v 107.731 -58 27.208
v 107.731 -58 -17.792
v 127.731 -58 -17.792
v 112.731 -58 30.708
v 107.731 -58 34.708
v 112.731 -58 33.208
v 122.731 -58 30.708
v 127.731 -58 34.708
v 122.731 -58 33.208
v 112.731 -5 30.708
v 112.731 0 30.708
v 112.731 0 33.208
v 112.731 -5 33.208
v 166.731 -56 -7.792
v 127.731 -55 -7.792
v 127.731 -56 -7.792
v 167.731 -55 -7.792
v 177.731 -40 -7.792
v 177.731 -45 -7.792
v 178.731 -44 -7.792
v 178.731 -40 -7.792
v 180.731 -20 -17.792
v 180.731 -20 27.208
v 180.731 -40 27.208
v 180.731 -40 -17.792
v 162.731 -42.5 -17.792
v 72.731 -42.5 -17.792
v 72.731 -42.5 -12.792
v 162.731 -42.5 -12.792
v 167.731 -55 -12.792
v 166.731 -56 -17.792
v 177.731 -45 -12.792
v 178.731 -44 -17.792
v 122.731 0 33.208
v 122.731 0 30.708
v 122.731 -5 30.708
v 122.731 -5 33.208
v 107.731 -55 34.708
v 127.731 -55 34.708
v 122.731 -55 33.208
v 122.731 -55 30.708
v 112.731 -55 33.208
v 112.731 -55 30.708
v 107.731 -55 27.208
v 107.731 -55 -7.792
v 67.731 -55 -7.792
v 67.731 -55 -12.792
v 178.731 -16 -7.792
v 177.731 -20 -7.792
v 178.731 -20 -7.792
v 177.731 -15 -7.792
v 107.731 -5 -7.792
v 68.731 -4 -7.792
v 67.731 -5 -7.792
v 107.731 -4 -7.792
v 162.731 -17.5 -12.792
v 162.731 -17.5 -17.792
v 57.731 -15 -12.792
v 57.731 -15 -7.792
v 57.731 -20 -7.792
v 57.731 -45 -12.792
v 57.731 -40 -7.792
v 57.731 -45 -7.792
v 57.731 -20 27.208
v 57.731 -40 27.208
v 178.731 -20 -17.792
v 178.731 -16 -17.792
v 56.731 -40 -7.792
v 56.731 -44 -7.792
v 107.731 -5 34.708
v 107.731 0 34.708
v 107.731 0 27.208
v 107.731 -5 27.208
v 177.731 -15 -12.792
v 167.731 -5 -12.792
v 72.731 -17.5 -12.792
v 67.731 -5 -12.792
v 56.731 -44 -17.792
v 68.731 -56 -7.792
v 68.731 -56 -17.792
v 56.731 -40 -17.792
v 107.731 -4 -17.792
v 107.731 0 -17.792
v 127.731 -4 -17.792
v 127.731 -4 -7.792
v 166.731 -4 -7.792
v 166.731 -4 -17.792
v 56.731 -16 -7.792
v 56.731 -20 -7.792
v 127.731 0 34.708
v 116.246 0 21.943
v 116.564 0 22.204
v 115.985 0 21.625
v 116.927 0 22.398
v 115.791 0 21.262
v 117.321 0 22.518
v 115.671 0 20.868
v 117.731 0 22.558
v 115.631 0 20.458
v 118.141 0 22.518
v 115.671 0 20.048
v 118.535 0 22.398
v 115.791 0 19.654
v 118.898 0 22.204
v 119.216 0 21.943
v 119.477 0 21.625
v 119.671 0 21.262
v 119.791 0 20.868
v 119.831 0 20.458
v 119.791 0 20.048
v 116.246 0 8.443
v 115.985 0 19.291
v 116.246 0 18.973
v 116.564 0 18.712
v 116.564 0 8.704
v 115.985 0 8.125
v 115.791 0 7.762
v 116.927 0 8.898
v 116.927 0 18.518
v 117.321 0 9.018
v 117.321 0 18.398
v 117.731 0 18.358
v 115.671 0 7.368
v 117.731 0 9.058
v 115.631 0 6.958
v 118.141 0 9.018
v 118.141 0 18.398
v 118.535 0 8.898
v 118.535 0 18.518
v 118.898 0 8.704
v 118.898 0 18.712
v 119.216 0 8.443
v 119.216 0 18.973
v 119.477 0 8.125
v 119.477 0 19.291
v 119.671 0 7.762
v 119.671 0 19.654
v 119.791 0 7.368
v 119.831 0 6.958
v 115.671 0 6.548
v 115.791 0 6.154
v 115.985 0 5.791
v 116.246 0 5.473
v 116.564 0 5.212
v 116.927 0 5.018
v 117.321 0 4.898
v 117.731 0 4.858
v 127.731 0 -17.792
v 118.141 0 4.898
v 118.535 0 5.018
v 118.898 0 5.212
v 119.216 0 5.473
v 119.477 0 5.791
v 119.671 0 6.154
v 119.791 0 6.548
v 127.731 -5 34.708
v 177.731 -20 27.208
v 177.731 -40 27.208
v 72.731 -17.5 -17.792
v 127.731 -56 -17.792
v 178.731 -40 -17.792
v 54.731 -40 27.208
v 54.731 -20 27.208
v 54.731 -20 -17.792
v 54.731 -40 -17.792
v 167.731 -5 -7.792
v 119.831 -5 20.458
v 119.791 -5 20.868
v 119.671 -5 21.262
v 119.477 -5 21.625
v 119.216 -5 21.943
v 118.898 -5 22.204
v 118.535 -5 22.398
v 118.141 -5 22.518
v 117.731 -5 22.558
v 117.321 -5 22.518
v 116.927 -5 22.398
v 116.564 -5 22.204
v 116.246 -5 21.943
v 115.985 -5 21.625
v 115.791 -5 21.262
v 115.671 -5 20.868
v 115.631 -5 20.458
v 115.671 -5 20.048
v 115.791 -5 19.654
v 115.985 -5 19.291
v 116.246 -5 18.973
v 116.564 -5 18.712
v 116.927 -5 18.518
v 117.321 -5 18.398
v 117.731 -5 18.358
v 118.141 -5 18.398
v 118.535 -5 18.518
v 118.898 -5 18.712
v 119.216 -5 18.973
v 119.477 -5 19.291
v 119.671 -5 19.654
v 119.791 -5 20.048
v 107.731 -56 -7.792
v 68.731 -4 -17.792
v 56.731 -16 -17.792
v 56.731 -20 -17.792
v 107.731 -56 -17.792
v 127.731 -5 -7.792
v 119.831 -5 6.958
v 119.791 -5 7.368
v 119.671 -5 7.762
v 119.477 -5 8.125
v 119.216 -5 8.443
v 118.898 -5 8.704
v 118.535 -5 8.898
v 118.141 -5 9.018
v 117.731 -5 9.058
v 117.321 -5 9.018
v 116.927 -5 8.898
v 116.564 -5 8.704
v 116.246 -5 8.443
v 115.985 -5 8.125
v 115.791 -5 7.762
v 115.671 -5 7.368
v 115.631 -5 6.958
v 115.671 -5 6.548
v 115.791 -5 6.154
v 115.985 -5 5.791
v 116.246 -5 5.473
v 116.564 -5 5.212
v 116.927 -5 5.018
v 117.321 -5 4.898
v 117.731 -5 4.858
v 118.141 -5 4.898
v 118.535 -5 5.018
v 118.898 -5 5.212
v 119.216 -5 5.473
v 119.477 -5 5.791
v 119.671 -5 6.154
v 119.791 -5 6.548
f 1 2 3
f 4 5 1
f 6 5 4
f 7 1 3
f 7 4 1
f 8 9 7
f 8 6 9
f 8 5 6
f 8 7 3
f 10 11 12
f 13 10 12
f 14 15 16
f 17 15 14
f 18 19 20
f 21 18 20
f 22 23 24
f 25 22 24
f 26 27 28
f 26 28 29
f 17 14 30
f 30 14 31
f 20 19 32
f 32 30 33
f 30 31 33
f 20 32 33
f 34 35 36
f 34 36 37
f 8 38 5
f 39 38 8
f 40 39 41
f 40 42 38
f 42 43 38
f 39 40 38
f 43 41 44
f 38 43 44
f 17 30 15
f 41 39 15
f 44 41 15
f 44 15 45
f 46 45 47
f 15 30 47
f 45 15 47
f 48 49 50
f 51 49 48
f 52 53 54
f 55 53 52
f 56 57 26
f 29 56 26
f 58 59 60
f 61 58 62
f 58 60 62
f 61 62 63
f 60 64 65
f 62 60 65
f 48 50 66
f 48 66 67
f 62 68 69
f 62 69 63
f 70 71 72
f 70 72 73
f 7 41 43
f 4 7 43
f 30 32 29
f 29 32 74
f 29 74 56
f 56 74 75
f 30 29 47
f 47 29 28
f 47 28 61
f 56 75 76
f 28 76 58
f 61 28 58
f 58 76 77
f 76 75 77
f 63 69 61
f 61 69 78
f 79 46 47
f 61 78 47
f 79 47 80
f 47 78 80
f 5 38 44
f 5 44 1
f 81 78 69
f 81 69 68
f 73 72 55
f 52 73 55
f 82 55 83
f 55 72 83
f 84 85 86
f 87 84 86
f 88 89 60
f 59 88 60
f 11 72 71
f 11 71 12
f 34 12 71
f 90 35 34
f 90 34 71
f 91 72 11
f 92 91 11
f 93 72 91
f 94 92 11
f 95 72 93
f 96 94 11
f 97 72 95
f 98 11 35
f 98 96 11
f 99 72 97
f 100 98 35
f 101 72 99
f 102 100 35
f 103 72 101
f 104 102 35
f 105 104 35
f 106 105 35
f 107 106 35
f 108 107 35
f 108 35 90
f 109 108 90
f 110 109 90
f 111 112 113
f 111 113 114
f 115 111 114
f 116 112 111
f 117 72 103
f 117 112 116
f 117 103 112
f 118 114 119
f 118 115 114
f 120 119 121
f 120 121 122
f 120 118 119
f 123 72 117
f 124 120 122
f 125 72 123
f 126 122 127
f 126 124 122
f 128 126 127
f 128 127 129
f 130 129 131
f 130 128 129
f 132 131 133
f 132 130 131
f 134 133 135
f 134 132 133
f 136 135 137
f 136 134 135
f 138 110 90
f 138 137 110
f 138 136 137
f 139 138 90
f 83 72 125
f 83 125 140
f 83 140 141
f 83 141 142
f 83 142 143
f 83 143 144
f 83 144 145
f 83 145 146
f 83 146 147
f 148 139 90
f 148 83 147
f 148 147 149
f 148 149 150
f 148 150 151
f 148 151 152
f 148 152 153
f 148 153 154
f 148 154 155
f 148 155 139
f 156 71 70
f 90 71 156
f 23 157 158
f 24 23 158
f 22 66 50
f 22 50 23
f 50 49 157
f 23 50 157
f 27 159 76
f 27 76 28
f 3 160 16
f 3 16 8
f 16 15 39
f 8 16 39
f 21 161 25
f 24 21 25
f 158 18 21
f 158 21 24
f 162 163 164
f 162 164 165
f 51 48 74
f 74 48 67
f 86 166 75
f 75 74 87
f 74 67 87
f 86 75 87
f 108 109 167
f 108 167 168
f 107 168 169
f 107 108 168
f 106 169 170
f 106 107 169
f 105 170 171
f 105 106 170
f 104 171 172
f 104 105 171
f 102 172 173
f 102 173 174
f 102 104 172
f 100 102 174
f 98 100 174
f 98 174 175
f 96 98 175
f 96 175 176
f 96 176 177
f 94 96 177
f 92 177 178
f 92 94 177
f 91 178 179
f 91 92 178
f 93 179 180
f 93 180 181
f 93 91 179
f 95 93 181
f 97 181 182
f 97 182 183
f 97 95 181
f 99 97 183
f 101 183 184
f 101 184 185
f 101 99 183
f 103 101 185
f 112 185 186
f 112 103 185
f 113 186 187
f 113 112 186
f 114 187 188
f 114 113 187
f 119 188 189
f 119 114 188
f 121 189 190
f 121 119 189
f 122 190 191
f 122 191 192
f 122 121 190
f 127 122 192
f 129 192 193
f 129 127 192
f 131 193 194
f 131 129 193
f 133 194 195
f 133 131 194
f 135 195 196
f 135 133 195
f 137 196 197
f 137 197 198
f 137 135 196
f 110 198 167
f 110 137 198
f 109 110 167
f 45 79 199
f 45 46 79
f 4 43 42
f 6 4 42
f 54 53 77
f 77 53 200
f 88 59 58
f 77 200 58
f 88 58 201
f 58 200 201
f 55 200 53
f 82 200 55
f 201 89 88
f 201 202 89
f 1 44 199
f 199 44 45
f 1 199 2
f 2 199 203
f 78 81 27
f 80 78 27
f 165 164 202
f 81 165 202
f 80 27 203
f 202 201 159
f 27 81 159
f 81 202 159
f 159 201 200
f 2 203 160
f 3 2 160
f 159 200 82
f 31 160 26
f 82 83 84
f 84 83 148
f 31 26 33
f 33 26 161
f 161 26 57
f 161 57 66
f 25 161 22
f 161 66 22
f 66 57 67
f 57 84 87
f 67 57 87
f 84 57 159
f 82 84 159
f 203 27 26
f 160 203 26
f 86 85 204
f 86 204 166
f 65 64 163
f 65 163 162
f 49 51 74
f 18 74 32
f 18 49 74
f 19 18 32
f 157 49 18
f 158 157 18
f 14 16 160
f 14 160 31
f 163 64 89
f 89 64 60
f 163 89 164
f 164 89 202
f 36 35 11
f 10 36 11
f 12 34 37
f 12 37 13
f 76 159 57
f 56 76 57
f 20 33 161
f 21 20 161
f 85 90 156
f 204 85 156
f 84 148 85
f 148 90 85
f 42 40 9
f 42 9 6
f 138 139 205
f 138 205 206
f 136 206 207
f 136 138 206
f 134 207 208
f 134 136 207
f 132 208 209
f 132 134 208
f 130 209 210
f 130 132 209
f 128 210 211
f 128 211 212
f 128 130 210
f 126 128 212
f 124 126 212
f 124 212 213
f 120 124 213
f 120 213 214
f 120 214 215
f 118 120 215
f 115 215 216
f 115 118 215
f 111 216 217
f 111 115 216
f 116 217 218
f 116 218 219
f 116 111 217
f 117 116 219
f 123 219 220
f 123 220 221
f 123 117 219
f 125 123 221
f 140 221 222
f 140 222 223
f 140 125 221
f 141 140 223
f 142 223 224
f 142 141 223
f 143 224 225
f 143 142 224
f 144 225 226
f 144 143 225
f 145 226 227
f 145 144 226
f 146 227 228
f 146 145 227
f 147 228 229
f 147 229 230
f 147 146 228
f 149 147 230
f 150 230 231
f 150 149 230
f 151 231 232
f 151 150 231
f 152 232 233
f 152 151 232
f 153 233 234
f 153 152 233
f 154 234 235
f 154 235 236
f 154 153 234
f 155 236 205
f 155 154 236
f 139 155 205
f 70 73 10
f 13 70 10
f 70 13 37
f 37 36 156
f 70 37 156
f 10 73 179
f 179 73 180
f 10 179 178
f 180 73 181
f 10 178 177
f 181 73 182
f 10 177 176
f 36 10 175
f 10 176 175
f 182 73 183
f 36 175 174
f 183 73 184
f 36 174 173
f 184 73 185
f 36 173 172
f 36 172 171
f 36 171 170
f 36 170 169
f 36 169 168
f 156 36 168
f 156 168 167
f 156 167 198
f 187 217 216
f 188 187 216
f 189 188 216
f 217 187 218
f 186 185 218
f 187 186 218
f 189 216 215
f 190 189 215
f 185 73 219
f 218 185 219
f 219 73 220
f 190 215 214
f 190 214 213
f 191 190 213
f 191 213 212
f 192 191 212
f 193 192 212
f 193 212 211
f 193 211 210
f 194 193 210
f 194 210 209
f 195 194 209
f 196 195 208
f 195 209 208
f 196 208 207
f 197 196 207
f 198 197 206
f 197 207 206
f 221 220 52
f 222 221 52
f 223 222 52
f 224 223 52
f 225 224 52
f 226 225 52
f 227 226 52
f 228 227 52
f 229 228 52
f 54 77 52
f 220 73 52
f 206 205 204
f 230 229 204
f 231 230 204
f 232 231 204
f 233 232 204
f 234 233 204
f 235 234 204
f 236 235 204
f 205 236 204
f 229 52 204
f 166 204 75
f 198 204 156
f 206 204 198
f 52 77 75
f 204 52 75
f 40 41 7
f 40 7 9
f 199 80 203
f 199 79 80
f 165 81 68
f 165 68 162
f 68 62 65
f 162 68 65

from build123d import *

# Parameters (mm, degrees)
F0_W          = 20.0000000001
F0_H          = 40
F0_R          = 2.1
F0_W_2        = 20
F0_H_2        = 5
F1_DEPTH      = 5
F2_START      = 5
F0_W_3        = 50
F2_DEPTH      = 50
F3_START      = 55
F3_DEPTH      = 3
F4_W          = 20
F4_H          = 40
F4_H_2        = 5
F5_DEPTH      = 3
F6_START      = -123
F5_FACE_W     = 20
F5_FACE_H     = 45
F6_DEPTH      = 3
F7_W          = 122
F7_H          = 52
F8_DEPTH      = 5
F8_DEPTH_BACK = 5
F9_DEPTH      = 7.5
F10_W         = 10
F10_H         = 2.5
F11_DEPTH     = 58
F12_W         = 90
F12_H         = 25
F13_DEPTH     = 10


with BuildPart() as f1:
    # F0 (on Front) → F1 (new body)
    with BuildSketch(Plane.XZ):
        with Locations((117.7309190904, 7.2080208344)):
            Rectangle(F0_W, F0_H)
        with Locations((117.7309190904, 6.9580208345)):
            Circle(F0_R, mode=Mode.SUBTRACT)
        with Locations((117.7309190904, 20.4580208344)):
            Circle(F0_R, mode=Mode.SUBTRACT)
        with Locations((117.7309190904, -15.2919791656)):
            Rectangle(F0_W_2, F0_H_2)
    extrude(amount=F1_DEPTH)

    # F0 (on Front) → F2 (join)
    with BuildSketch(Plane.XZ.offset(F2_START)):
        with Locations((82.7309190904, -15.2919791656)):
            Rectangle(F0_W_3, F0_H_2)
        with Locations((152.7309190904, -15.2919791656)):
            Rectangle(F0_W_3, F0_H_2)
        with Locations((117.7309190904, -15.2919791656)):
            Rectangle(F0_W_2, F0_H_2)
    extrude(amount=F2_DEPTH)

    # F0 (on Front) → F3 (join)
    with BuildSketch(Plane.XZ.offset(F3_START)):
        with Locations((117.7309190904, 7.2080208344)):
            Rectangle(F0_W, F0_H)
        with Locations((117.7309190904, 6.9580208345)):
            Circle(F0_R, mode=Mode.SUBTRACT)
        with Locations((117.7309190904, 20.4580208344)):
            Circle(F0_R, mode=Mode.SUBTRACT)
        with Locations((117.7309190904, -15.2919791656)):
            Rectangle(F0_W_2, F0_H_2)
        with Locations((117.7309190904, 20.4580208344)):
            Circle(F0_R)
        with Locations((117.7309190904, 6.9580208345)):
            Circle(F0_R)
    extrude(amount=F3_DEPTH)

    # F4 (on face) → F5 (join)
    with BuildSketch(Plane(origin=(57.7309190904, 0, 0), x_dir=(0, -1, 0), z_dir=(-1, 0, 0))):
        with Locations((30, 7.2080208344)):
            Rectangle(F4_W, F4_H)
        with Locations((30, -15.2919791656)):
            Rectangle(F4_W, F4_H_2)
    extrude(amount=F5_DEPTH)

    # F5_face (on face) → F6 (join)
    with BuildSketch(Plane(origin=(54.7309190904, -30, 4.7080208344), x_dir=(0, -1, 0), z_dir=(-1, 0, 0)).offset(F6_START)):
        Rectangle(F5_FACE_W, F5_FACE_H)
    extrude(amount=-F6_DEPTH)

    # F7 (on face) → F8 (join, two sides)
    with BuildSketch(Plane.XY.offset(-12.7919791656)) as f8_sk:
        with Locations((117.7309190904, -30)):
            Rectangle(F7_W, F7_H)
        Polygon((177.7309190904, -5), (177.7309190904, -20), (177.7309190904, -40), (177.7309190904, -55), (127.7309190904, -55), (107.7309190904, -55), (57.7309190904, -55), (57.7309190904, -40), (57.7309190904, -20), (57.7309190904, -5), (107.7309190904, -5), (127.7309190904, -5), align=None, mode=Mode.SUBTRACT)
    extrude(amount=F8_DEPTH)
    extrude(f8_sk.sketch, amount=-F8_DEPTH_BACK)

    # F9 (add): faces of the model
    f9_faces = [f1.faces().sort_by_distance(p)[0] for p in [
        (117.7309190904, -2.5, 27.2080208344),
        (117.7309190904, -56.5, 27.2080208344),
    ]]
    extrude(f9_faces, amount=F9_DEPTH)

    # F10 (on face) → F11 (cut, through all)
    with BuildSketch(Plane(origin=(0, 0, 0), x_dir=(-1, 0, 0), z_dir=(0, 1, 0))):
        with Locations((-117.7309190904, 31.9580208344)):
            Rectangle(F10_W, F10_H)
    extrude(amount=-F11_DEPTH, mode=Mode.SUBTRACT)

    # F12 (on face) → F13 (cut, through all)
    with BuildSketch(Plane(origin=(0, 0, -17.7919791656), x_dir=(1, 0, 0), z_dir=(0, 0, -1))):
        Polygon((56.7309190904, 4), (68.7309190904, 4), (56.7309190904, 16), align=None)
        Polygon((56.7309190904, 56), (56.7309190904, 44), (68.7309190904, 56), align=None)
        Polygon((166.7309190904, 56), (178.7309190904, 44), (178.7309190904, 56), align=None)
        Polygon((178.7309190904, 16), (166.7309190904, 4), (178.7309190904, 4), align=None)
        with Locations((117.7309190904, 30)):
            Rectangle(F12_W, F12_H)
    extrude(amount=-F13_DEPTH, mode=Mode.SUBTRACT)


solid = f1.part
